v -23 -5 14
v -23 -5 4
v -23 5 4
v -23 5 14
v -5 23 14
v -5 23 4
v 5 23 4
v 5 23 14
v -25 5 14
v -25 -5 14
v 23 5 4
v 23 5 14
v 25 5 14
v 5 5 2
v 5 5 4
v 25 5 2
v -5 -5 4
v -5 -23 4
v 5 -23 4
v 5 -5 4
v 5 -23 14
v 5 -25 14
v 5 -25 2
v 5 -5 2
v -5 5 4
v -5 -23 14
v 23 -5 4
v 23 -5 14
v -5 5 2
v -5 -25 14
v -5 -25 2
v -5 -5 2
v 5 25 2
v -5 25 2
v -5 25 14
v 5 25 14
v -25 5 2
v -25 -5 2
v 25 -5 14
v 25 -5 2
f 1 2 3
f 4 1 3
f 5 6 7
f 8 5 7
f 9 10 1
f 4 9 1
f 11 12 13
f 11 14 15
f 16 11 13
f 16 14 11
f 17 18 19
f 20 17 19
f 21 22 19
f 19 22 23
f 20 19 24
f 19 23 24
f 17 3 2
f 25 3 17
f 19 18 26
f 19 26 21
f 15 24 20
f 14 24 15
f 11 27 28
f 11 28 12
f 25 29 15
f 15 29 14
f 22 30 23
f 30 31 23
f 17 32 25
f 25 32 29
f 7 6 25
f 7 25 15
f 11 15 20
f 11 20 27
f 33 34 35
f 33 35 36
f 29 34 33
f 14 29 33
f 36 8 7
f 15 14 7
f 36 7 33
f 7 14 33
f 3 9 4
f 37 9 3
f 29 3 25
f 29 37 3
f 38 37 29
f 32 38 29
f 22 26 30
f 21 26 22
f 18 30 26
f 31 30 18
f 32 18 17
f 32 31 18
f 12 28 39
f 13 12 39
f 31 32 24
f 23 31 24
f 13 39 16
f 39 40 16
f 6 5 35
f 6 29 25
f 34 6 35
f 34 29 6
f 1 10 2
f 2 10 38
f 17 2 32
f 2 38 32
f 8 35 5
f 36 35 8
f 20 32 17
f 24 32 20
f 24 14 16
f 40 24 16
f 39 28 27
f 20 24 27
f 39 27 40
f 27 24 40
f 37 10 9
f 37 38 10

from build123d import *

# Parameters (mm, degrees)
F0_W      = 300
F0_H      = 160
F1_DEPTH  = 2
F2_W      = 10
F2_H      = 20
F2_W_2    = 20
F2_H_2    = 10
F3_DEPTH  = 2
F4_W      = 10
F4_H      = 2
F5_DEPTH  = 10
F6_W      = 2
F6_H      = 10
F7_DEPTH  = 10
F8_W      = 2
F8_H      = 10
F9_DEPTH  = 10
F10_W     = 10
F10_H     = 2
F11_DEPTH = 10


with BuildPart() as f1:
    # F0 (on Top) → F1 (new body)
    with BuildSketch(Plane.XY):
        Rectangle(F0_W, F0_H)
    extrude(amount=F1_DEPTH)


with BuildPart() as f3:
    # F2 (on face) → F3 (new body)
    with BuildSketch(Plane.XY.offset(2)):
        with Locations((0, 15)):
            Rectangle(F2_W, F2_H)
        with Locations((-15, 0)):
            Rectangle(F2_W_2, F2_H_2)
        with Locations((0, -15)):
            Rectangle(F2_W, F2_H)
        with Locations((15, 0)):
            Rectangle(F2_W_2, F2_H_2)
    extrude(amount=F3_DEPTH)

    # F4 (on face) → F5 (join)
    with BuildSketch(Plane.XY.offset(4)):
        with Locations((0, 24)):
            Rectangle(F4_W, F4_H)
    extrude(amount=F5_DEPTH)

    # F6 (on face) → F7 (join)
    with BuildSketch(Plane.XY.offset(4)):
        with Locations((-24, 0)):
            Rectangle(F6_W, F6_H)
    extrude(amount=F7_DEPTH)

    # F8 (on face) → F9 (join)
    with BuildSketch(Plane.XY.offset(4)):
        with Locations((24, 0)):
            Rectangle(F8_W, F8_H)
    extrude(amount=F9_DEPTH)

    # F10 (on face) → F11 (join)
    with BuildSketch(Plane.XY.offset(4)):
        with Locations((0, -24)):
            Rectangle(F10_W, F10_H)
    extrude(amount=F11_DEPTH)


solid = f3.part
